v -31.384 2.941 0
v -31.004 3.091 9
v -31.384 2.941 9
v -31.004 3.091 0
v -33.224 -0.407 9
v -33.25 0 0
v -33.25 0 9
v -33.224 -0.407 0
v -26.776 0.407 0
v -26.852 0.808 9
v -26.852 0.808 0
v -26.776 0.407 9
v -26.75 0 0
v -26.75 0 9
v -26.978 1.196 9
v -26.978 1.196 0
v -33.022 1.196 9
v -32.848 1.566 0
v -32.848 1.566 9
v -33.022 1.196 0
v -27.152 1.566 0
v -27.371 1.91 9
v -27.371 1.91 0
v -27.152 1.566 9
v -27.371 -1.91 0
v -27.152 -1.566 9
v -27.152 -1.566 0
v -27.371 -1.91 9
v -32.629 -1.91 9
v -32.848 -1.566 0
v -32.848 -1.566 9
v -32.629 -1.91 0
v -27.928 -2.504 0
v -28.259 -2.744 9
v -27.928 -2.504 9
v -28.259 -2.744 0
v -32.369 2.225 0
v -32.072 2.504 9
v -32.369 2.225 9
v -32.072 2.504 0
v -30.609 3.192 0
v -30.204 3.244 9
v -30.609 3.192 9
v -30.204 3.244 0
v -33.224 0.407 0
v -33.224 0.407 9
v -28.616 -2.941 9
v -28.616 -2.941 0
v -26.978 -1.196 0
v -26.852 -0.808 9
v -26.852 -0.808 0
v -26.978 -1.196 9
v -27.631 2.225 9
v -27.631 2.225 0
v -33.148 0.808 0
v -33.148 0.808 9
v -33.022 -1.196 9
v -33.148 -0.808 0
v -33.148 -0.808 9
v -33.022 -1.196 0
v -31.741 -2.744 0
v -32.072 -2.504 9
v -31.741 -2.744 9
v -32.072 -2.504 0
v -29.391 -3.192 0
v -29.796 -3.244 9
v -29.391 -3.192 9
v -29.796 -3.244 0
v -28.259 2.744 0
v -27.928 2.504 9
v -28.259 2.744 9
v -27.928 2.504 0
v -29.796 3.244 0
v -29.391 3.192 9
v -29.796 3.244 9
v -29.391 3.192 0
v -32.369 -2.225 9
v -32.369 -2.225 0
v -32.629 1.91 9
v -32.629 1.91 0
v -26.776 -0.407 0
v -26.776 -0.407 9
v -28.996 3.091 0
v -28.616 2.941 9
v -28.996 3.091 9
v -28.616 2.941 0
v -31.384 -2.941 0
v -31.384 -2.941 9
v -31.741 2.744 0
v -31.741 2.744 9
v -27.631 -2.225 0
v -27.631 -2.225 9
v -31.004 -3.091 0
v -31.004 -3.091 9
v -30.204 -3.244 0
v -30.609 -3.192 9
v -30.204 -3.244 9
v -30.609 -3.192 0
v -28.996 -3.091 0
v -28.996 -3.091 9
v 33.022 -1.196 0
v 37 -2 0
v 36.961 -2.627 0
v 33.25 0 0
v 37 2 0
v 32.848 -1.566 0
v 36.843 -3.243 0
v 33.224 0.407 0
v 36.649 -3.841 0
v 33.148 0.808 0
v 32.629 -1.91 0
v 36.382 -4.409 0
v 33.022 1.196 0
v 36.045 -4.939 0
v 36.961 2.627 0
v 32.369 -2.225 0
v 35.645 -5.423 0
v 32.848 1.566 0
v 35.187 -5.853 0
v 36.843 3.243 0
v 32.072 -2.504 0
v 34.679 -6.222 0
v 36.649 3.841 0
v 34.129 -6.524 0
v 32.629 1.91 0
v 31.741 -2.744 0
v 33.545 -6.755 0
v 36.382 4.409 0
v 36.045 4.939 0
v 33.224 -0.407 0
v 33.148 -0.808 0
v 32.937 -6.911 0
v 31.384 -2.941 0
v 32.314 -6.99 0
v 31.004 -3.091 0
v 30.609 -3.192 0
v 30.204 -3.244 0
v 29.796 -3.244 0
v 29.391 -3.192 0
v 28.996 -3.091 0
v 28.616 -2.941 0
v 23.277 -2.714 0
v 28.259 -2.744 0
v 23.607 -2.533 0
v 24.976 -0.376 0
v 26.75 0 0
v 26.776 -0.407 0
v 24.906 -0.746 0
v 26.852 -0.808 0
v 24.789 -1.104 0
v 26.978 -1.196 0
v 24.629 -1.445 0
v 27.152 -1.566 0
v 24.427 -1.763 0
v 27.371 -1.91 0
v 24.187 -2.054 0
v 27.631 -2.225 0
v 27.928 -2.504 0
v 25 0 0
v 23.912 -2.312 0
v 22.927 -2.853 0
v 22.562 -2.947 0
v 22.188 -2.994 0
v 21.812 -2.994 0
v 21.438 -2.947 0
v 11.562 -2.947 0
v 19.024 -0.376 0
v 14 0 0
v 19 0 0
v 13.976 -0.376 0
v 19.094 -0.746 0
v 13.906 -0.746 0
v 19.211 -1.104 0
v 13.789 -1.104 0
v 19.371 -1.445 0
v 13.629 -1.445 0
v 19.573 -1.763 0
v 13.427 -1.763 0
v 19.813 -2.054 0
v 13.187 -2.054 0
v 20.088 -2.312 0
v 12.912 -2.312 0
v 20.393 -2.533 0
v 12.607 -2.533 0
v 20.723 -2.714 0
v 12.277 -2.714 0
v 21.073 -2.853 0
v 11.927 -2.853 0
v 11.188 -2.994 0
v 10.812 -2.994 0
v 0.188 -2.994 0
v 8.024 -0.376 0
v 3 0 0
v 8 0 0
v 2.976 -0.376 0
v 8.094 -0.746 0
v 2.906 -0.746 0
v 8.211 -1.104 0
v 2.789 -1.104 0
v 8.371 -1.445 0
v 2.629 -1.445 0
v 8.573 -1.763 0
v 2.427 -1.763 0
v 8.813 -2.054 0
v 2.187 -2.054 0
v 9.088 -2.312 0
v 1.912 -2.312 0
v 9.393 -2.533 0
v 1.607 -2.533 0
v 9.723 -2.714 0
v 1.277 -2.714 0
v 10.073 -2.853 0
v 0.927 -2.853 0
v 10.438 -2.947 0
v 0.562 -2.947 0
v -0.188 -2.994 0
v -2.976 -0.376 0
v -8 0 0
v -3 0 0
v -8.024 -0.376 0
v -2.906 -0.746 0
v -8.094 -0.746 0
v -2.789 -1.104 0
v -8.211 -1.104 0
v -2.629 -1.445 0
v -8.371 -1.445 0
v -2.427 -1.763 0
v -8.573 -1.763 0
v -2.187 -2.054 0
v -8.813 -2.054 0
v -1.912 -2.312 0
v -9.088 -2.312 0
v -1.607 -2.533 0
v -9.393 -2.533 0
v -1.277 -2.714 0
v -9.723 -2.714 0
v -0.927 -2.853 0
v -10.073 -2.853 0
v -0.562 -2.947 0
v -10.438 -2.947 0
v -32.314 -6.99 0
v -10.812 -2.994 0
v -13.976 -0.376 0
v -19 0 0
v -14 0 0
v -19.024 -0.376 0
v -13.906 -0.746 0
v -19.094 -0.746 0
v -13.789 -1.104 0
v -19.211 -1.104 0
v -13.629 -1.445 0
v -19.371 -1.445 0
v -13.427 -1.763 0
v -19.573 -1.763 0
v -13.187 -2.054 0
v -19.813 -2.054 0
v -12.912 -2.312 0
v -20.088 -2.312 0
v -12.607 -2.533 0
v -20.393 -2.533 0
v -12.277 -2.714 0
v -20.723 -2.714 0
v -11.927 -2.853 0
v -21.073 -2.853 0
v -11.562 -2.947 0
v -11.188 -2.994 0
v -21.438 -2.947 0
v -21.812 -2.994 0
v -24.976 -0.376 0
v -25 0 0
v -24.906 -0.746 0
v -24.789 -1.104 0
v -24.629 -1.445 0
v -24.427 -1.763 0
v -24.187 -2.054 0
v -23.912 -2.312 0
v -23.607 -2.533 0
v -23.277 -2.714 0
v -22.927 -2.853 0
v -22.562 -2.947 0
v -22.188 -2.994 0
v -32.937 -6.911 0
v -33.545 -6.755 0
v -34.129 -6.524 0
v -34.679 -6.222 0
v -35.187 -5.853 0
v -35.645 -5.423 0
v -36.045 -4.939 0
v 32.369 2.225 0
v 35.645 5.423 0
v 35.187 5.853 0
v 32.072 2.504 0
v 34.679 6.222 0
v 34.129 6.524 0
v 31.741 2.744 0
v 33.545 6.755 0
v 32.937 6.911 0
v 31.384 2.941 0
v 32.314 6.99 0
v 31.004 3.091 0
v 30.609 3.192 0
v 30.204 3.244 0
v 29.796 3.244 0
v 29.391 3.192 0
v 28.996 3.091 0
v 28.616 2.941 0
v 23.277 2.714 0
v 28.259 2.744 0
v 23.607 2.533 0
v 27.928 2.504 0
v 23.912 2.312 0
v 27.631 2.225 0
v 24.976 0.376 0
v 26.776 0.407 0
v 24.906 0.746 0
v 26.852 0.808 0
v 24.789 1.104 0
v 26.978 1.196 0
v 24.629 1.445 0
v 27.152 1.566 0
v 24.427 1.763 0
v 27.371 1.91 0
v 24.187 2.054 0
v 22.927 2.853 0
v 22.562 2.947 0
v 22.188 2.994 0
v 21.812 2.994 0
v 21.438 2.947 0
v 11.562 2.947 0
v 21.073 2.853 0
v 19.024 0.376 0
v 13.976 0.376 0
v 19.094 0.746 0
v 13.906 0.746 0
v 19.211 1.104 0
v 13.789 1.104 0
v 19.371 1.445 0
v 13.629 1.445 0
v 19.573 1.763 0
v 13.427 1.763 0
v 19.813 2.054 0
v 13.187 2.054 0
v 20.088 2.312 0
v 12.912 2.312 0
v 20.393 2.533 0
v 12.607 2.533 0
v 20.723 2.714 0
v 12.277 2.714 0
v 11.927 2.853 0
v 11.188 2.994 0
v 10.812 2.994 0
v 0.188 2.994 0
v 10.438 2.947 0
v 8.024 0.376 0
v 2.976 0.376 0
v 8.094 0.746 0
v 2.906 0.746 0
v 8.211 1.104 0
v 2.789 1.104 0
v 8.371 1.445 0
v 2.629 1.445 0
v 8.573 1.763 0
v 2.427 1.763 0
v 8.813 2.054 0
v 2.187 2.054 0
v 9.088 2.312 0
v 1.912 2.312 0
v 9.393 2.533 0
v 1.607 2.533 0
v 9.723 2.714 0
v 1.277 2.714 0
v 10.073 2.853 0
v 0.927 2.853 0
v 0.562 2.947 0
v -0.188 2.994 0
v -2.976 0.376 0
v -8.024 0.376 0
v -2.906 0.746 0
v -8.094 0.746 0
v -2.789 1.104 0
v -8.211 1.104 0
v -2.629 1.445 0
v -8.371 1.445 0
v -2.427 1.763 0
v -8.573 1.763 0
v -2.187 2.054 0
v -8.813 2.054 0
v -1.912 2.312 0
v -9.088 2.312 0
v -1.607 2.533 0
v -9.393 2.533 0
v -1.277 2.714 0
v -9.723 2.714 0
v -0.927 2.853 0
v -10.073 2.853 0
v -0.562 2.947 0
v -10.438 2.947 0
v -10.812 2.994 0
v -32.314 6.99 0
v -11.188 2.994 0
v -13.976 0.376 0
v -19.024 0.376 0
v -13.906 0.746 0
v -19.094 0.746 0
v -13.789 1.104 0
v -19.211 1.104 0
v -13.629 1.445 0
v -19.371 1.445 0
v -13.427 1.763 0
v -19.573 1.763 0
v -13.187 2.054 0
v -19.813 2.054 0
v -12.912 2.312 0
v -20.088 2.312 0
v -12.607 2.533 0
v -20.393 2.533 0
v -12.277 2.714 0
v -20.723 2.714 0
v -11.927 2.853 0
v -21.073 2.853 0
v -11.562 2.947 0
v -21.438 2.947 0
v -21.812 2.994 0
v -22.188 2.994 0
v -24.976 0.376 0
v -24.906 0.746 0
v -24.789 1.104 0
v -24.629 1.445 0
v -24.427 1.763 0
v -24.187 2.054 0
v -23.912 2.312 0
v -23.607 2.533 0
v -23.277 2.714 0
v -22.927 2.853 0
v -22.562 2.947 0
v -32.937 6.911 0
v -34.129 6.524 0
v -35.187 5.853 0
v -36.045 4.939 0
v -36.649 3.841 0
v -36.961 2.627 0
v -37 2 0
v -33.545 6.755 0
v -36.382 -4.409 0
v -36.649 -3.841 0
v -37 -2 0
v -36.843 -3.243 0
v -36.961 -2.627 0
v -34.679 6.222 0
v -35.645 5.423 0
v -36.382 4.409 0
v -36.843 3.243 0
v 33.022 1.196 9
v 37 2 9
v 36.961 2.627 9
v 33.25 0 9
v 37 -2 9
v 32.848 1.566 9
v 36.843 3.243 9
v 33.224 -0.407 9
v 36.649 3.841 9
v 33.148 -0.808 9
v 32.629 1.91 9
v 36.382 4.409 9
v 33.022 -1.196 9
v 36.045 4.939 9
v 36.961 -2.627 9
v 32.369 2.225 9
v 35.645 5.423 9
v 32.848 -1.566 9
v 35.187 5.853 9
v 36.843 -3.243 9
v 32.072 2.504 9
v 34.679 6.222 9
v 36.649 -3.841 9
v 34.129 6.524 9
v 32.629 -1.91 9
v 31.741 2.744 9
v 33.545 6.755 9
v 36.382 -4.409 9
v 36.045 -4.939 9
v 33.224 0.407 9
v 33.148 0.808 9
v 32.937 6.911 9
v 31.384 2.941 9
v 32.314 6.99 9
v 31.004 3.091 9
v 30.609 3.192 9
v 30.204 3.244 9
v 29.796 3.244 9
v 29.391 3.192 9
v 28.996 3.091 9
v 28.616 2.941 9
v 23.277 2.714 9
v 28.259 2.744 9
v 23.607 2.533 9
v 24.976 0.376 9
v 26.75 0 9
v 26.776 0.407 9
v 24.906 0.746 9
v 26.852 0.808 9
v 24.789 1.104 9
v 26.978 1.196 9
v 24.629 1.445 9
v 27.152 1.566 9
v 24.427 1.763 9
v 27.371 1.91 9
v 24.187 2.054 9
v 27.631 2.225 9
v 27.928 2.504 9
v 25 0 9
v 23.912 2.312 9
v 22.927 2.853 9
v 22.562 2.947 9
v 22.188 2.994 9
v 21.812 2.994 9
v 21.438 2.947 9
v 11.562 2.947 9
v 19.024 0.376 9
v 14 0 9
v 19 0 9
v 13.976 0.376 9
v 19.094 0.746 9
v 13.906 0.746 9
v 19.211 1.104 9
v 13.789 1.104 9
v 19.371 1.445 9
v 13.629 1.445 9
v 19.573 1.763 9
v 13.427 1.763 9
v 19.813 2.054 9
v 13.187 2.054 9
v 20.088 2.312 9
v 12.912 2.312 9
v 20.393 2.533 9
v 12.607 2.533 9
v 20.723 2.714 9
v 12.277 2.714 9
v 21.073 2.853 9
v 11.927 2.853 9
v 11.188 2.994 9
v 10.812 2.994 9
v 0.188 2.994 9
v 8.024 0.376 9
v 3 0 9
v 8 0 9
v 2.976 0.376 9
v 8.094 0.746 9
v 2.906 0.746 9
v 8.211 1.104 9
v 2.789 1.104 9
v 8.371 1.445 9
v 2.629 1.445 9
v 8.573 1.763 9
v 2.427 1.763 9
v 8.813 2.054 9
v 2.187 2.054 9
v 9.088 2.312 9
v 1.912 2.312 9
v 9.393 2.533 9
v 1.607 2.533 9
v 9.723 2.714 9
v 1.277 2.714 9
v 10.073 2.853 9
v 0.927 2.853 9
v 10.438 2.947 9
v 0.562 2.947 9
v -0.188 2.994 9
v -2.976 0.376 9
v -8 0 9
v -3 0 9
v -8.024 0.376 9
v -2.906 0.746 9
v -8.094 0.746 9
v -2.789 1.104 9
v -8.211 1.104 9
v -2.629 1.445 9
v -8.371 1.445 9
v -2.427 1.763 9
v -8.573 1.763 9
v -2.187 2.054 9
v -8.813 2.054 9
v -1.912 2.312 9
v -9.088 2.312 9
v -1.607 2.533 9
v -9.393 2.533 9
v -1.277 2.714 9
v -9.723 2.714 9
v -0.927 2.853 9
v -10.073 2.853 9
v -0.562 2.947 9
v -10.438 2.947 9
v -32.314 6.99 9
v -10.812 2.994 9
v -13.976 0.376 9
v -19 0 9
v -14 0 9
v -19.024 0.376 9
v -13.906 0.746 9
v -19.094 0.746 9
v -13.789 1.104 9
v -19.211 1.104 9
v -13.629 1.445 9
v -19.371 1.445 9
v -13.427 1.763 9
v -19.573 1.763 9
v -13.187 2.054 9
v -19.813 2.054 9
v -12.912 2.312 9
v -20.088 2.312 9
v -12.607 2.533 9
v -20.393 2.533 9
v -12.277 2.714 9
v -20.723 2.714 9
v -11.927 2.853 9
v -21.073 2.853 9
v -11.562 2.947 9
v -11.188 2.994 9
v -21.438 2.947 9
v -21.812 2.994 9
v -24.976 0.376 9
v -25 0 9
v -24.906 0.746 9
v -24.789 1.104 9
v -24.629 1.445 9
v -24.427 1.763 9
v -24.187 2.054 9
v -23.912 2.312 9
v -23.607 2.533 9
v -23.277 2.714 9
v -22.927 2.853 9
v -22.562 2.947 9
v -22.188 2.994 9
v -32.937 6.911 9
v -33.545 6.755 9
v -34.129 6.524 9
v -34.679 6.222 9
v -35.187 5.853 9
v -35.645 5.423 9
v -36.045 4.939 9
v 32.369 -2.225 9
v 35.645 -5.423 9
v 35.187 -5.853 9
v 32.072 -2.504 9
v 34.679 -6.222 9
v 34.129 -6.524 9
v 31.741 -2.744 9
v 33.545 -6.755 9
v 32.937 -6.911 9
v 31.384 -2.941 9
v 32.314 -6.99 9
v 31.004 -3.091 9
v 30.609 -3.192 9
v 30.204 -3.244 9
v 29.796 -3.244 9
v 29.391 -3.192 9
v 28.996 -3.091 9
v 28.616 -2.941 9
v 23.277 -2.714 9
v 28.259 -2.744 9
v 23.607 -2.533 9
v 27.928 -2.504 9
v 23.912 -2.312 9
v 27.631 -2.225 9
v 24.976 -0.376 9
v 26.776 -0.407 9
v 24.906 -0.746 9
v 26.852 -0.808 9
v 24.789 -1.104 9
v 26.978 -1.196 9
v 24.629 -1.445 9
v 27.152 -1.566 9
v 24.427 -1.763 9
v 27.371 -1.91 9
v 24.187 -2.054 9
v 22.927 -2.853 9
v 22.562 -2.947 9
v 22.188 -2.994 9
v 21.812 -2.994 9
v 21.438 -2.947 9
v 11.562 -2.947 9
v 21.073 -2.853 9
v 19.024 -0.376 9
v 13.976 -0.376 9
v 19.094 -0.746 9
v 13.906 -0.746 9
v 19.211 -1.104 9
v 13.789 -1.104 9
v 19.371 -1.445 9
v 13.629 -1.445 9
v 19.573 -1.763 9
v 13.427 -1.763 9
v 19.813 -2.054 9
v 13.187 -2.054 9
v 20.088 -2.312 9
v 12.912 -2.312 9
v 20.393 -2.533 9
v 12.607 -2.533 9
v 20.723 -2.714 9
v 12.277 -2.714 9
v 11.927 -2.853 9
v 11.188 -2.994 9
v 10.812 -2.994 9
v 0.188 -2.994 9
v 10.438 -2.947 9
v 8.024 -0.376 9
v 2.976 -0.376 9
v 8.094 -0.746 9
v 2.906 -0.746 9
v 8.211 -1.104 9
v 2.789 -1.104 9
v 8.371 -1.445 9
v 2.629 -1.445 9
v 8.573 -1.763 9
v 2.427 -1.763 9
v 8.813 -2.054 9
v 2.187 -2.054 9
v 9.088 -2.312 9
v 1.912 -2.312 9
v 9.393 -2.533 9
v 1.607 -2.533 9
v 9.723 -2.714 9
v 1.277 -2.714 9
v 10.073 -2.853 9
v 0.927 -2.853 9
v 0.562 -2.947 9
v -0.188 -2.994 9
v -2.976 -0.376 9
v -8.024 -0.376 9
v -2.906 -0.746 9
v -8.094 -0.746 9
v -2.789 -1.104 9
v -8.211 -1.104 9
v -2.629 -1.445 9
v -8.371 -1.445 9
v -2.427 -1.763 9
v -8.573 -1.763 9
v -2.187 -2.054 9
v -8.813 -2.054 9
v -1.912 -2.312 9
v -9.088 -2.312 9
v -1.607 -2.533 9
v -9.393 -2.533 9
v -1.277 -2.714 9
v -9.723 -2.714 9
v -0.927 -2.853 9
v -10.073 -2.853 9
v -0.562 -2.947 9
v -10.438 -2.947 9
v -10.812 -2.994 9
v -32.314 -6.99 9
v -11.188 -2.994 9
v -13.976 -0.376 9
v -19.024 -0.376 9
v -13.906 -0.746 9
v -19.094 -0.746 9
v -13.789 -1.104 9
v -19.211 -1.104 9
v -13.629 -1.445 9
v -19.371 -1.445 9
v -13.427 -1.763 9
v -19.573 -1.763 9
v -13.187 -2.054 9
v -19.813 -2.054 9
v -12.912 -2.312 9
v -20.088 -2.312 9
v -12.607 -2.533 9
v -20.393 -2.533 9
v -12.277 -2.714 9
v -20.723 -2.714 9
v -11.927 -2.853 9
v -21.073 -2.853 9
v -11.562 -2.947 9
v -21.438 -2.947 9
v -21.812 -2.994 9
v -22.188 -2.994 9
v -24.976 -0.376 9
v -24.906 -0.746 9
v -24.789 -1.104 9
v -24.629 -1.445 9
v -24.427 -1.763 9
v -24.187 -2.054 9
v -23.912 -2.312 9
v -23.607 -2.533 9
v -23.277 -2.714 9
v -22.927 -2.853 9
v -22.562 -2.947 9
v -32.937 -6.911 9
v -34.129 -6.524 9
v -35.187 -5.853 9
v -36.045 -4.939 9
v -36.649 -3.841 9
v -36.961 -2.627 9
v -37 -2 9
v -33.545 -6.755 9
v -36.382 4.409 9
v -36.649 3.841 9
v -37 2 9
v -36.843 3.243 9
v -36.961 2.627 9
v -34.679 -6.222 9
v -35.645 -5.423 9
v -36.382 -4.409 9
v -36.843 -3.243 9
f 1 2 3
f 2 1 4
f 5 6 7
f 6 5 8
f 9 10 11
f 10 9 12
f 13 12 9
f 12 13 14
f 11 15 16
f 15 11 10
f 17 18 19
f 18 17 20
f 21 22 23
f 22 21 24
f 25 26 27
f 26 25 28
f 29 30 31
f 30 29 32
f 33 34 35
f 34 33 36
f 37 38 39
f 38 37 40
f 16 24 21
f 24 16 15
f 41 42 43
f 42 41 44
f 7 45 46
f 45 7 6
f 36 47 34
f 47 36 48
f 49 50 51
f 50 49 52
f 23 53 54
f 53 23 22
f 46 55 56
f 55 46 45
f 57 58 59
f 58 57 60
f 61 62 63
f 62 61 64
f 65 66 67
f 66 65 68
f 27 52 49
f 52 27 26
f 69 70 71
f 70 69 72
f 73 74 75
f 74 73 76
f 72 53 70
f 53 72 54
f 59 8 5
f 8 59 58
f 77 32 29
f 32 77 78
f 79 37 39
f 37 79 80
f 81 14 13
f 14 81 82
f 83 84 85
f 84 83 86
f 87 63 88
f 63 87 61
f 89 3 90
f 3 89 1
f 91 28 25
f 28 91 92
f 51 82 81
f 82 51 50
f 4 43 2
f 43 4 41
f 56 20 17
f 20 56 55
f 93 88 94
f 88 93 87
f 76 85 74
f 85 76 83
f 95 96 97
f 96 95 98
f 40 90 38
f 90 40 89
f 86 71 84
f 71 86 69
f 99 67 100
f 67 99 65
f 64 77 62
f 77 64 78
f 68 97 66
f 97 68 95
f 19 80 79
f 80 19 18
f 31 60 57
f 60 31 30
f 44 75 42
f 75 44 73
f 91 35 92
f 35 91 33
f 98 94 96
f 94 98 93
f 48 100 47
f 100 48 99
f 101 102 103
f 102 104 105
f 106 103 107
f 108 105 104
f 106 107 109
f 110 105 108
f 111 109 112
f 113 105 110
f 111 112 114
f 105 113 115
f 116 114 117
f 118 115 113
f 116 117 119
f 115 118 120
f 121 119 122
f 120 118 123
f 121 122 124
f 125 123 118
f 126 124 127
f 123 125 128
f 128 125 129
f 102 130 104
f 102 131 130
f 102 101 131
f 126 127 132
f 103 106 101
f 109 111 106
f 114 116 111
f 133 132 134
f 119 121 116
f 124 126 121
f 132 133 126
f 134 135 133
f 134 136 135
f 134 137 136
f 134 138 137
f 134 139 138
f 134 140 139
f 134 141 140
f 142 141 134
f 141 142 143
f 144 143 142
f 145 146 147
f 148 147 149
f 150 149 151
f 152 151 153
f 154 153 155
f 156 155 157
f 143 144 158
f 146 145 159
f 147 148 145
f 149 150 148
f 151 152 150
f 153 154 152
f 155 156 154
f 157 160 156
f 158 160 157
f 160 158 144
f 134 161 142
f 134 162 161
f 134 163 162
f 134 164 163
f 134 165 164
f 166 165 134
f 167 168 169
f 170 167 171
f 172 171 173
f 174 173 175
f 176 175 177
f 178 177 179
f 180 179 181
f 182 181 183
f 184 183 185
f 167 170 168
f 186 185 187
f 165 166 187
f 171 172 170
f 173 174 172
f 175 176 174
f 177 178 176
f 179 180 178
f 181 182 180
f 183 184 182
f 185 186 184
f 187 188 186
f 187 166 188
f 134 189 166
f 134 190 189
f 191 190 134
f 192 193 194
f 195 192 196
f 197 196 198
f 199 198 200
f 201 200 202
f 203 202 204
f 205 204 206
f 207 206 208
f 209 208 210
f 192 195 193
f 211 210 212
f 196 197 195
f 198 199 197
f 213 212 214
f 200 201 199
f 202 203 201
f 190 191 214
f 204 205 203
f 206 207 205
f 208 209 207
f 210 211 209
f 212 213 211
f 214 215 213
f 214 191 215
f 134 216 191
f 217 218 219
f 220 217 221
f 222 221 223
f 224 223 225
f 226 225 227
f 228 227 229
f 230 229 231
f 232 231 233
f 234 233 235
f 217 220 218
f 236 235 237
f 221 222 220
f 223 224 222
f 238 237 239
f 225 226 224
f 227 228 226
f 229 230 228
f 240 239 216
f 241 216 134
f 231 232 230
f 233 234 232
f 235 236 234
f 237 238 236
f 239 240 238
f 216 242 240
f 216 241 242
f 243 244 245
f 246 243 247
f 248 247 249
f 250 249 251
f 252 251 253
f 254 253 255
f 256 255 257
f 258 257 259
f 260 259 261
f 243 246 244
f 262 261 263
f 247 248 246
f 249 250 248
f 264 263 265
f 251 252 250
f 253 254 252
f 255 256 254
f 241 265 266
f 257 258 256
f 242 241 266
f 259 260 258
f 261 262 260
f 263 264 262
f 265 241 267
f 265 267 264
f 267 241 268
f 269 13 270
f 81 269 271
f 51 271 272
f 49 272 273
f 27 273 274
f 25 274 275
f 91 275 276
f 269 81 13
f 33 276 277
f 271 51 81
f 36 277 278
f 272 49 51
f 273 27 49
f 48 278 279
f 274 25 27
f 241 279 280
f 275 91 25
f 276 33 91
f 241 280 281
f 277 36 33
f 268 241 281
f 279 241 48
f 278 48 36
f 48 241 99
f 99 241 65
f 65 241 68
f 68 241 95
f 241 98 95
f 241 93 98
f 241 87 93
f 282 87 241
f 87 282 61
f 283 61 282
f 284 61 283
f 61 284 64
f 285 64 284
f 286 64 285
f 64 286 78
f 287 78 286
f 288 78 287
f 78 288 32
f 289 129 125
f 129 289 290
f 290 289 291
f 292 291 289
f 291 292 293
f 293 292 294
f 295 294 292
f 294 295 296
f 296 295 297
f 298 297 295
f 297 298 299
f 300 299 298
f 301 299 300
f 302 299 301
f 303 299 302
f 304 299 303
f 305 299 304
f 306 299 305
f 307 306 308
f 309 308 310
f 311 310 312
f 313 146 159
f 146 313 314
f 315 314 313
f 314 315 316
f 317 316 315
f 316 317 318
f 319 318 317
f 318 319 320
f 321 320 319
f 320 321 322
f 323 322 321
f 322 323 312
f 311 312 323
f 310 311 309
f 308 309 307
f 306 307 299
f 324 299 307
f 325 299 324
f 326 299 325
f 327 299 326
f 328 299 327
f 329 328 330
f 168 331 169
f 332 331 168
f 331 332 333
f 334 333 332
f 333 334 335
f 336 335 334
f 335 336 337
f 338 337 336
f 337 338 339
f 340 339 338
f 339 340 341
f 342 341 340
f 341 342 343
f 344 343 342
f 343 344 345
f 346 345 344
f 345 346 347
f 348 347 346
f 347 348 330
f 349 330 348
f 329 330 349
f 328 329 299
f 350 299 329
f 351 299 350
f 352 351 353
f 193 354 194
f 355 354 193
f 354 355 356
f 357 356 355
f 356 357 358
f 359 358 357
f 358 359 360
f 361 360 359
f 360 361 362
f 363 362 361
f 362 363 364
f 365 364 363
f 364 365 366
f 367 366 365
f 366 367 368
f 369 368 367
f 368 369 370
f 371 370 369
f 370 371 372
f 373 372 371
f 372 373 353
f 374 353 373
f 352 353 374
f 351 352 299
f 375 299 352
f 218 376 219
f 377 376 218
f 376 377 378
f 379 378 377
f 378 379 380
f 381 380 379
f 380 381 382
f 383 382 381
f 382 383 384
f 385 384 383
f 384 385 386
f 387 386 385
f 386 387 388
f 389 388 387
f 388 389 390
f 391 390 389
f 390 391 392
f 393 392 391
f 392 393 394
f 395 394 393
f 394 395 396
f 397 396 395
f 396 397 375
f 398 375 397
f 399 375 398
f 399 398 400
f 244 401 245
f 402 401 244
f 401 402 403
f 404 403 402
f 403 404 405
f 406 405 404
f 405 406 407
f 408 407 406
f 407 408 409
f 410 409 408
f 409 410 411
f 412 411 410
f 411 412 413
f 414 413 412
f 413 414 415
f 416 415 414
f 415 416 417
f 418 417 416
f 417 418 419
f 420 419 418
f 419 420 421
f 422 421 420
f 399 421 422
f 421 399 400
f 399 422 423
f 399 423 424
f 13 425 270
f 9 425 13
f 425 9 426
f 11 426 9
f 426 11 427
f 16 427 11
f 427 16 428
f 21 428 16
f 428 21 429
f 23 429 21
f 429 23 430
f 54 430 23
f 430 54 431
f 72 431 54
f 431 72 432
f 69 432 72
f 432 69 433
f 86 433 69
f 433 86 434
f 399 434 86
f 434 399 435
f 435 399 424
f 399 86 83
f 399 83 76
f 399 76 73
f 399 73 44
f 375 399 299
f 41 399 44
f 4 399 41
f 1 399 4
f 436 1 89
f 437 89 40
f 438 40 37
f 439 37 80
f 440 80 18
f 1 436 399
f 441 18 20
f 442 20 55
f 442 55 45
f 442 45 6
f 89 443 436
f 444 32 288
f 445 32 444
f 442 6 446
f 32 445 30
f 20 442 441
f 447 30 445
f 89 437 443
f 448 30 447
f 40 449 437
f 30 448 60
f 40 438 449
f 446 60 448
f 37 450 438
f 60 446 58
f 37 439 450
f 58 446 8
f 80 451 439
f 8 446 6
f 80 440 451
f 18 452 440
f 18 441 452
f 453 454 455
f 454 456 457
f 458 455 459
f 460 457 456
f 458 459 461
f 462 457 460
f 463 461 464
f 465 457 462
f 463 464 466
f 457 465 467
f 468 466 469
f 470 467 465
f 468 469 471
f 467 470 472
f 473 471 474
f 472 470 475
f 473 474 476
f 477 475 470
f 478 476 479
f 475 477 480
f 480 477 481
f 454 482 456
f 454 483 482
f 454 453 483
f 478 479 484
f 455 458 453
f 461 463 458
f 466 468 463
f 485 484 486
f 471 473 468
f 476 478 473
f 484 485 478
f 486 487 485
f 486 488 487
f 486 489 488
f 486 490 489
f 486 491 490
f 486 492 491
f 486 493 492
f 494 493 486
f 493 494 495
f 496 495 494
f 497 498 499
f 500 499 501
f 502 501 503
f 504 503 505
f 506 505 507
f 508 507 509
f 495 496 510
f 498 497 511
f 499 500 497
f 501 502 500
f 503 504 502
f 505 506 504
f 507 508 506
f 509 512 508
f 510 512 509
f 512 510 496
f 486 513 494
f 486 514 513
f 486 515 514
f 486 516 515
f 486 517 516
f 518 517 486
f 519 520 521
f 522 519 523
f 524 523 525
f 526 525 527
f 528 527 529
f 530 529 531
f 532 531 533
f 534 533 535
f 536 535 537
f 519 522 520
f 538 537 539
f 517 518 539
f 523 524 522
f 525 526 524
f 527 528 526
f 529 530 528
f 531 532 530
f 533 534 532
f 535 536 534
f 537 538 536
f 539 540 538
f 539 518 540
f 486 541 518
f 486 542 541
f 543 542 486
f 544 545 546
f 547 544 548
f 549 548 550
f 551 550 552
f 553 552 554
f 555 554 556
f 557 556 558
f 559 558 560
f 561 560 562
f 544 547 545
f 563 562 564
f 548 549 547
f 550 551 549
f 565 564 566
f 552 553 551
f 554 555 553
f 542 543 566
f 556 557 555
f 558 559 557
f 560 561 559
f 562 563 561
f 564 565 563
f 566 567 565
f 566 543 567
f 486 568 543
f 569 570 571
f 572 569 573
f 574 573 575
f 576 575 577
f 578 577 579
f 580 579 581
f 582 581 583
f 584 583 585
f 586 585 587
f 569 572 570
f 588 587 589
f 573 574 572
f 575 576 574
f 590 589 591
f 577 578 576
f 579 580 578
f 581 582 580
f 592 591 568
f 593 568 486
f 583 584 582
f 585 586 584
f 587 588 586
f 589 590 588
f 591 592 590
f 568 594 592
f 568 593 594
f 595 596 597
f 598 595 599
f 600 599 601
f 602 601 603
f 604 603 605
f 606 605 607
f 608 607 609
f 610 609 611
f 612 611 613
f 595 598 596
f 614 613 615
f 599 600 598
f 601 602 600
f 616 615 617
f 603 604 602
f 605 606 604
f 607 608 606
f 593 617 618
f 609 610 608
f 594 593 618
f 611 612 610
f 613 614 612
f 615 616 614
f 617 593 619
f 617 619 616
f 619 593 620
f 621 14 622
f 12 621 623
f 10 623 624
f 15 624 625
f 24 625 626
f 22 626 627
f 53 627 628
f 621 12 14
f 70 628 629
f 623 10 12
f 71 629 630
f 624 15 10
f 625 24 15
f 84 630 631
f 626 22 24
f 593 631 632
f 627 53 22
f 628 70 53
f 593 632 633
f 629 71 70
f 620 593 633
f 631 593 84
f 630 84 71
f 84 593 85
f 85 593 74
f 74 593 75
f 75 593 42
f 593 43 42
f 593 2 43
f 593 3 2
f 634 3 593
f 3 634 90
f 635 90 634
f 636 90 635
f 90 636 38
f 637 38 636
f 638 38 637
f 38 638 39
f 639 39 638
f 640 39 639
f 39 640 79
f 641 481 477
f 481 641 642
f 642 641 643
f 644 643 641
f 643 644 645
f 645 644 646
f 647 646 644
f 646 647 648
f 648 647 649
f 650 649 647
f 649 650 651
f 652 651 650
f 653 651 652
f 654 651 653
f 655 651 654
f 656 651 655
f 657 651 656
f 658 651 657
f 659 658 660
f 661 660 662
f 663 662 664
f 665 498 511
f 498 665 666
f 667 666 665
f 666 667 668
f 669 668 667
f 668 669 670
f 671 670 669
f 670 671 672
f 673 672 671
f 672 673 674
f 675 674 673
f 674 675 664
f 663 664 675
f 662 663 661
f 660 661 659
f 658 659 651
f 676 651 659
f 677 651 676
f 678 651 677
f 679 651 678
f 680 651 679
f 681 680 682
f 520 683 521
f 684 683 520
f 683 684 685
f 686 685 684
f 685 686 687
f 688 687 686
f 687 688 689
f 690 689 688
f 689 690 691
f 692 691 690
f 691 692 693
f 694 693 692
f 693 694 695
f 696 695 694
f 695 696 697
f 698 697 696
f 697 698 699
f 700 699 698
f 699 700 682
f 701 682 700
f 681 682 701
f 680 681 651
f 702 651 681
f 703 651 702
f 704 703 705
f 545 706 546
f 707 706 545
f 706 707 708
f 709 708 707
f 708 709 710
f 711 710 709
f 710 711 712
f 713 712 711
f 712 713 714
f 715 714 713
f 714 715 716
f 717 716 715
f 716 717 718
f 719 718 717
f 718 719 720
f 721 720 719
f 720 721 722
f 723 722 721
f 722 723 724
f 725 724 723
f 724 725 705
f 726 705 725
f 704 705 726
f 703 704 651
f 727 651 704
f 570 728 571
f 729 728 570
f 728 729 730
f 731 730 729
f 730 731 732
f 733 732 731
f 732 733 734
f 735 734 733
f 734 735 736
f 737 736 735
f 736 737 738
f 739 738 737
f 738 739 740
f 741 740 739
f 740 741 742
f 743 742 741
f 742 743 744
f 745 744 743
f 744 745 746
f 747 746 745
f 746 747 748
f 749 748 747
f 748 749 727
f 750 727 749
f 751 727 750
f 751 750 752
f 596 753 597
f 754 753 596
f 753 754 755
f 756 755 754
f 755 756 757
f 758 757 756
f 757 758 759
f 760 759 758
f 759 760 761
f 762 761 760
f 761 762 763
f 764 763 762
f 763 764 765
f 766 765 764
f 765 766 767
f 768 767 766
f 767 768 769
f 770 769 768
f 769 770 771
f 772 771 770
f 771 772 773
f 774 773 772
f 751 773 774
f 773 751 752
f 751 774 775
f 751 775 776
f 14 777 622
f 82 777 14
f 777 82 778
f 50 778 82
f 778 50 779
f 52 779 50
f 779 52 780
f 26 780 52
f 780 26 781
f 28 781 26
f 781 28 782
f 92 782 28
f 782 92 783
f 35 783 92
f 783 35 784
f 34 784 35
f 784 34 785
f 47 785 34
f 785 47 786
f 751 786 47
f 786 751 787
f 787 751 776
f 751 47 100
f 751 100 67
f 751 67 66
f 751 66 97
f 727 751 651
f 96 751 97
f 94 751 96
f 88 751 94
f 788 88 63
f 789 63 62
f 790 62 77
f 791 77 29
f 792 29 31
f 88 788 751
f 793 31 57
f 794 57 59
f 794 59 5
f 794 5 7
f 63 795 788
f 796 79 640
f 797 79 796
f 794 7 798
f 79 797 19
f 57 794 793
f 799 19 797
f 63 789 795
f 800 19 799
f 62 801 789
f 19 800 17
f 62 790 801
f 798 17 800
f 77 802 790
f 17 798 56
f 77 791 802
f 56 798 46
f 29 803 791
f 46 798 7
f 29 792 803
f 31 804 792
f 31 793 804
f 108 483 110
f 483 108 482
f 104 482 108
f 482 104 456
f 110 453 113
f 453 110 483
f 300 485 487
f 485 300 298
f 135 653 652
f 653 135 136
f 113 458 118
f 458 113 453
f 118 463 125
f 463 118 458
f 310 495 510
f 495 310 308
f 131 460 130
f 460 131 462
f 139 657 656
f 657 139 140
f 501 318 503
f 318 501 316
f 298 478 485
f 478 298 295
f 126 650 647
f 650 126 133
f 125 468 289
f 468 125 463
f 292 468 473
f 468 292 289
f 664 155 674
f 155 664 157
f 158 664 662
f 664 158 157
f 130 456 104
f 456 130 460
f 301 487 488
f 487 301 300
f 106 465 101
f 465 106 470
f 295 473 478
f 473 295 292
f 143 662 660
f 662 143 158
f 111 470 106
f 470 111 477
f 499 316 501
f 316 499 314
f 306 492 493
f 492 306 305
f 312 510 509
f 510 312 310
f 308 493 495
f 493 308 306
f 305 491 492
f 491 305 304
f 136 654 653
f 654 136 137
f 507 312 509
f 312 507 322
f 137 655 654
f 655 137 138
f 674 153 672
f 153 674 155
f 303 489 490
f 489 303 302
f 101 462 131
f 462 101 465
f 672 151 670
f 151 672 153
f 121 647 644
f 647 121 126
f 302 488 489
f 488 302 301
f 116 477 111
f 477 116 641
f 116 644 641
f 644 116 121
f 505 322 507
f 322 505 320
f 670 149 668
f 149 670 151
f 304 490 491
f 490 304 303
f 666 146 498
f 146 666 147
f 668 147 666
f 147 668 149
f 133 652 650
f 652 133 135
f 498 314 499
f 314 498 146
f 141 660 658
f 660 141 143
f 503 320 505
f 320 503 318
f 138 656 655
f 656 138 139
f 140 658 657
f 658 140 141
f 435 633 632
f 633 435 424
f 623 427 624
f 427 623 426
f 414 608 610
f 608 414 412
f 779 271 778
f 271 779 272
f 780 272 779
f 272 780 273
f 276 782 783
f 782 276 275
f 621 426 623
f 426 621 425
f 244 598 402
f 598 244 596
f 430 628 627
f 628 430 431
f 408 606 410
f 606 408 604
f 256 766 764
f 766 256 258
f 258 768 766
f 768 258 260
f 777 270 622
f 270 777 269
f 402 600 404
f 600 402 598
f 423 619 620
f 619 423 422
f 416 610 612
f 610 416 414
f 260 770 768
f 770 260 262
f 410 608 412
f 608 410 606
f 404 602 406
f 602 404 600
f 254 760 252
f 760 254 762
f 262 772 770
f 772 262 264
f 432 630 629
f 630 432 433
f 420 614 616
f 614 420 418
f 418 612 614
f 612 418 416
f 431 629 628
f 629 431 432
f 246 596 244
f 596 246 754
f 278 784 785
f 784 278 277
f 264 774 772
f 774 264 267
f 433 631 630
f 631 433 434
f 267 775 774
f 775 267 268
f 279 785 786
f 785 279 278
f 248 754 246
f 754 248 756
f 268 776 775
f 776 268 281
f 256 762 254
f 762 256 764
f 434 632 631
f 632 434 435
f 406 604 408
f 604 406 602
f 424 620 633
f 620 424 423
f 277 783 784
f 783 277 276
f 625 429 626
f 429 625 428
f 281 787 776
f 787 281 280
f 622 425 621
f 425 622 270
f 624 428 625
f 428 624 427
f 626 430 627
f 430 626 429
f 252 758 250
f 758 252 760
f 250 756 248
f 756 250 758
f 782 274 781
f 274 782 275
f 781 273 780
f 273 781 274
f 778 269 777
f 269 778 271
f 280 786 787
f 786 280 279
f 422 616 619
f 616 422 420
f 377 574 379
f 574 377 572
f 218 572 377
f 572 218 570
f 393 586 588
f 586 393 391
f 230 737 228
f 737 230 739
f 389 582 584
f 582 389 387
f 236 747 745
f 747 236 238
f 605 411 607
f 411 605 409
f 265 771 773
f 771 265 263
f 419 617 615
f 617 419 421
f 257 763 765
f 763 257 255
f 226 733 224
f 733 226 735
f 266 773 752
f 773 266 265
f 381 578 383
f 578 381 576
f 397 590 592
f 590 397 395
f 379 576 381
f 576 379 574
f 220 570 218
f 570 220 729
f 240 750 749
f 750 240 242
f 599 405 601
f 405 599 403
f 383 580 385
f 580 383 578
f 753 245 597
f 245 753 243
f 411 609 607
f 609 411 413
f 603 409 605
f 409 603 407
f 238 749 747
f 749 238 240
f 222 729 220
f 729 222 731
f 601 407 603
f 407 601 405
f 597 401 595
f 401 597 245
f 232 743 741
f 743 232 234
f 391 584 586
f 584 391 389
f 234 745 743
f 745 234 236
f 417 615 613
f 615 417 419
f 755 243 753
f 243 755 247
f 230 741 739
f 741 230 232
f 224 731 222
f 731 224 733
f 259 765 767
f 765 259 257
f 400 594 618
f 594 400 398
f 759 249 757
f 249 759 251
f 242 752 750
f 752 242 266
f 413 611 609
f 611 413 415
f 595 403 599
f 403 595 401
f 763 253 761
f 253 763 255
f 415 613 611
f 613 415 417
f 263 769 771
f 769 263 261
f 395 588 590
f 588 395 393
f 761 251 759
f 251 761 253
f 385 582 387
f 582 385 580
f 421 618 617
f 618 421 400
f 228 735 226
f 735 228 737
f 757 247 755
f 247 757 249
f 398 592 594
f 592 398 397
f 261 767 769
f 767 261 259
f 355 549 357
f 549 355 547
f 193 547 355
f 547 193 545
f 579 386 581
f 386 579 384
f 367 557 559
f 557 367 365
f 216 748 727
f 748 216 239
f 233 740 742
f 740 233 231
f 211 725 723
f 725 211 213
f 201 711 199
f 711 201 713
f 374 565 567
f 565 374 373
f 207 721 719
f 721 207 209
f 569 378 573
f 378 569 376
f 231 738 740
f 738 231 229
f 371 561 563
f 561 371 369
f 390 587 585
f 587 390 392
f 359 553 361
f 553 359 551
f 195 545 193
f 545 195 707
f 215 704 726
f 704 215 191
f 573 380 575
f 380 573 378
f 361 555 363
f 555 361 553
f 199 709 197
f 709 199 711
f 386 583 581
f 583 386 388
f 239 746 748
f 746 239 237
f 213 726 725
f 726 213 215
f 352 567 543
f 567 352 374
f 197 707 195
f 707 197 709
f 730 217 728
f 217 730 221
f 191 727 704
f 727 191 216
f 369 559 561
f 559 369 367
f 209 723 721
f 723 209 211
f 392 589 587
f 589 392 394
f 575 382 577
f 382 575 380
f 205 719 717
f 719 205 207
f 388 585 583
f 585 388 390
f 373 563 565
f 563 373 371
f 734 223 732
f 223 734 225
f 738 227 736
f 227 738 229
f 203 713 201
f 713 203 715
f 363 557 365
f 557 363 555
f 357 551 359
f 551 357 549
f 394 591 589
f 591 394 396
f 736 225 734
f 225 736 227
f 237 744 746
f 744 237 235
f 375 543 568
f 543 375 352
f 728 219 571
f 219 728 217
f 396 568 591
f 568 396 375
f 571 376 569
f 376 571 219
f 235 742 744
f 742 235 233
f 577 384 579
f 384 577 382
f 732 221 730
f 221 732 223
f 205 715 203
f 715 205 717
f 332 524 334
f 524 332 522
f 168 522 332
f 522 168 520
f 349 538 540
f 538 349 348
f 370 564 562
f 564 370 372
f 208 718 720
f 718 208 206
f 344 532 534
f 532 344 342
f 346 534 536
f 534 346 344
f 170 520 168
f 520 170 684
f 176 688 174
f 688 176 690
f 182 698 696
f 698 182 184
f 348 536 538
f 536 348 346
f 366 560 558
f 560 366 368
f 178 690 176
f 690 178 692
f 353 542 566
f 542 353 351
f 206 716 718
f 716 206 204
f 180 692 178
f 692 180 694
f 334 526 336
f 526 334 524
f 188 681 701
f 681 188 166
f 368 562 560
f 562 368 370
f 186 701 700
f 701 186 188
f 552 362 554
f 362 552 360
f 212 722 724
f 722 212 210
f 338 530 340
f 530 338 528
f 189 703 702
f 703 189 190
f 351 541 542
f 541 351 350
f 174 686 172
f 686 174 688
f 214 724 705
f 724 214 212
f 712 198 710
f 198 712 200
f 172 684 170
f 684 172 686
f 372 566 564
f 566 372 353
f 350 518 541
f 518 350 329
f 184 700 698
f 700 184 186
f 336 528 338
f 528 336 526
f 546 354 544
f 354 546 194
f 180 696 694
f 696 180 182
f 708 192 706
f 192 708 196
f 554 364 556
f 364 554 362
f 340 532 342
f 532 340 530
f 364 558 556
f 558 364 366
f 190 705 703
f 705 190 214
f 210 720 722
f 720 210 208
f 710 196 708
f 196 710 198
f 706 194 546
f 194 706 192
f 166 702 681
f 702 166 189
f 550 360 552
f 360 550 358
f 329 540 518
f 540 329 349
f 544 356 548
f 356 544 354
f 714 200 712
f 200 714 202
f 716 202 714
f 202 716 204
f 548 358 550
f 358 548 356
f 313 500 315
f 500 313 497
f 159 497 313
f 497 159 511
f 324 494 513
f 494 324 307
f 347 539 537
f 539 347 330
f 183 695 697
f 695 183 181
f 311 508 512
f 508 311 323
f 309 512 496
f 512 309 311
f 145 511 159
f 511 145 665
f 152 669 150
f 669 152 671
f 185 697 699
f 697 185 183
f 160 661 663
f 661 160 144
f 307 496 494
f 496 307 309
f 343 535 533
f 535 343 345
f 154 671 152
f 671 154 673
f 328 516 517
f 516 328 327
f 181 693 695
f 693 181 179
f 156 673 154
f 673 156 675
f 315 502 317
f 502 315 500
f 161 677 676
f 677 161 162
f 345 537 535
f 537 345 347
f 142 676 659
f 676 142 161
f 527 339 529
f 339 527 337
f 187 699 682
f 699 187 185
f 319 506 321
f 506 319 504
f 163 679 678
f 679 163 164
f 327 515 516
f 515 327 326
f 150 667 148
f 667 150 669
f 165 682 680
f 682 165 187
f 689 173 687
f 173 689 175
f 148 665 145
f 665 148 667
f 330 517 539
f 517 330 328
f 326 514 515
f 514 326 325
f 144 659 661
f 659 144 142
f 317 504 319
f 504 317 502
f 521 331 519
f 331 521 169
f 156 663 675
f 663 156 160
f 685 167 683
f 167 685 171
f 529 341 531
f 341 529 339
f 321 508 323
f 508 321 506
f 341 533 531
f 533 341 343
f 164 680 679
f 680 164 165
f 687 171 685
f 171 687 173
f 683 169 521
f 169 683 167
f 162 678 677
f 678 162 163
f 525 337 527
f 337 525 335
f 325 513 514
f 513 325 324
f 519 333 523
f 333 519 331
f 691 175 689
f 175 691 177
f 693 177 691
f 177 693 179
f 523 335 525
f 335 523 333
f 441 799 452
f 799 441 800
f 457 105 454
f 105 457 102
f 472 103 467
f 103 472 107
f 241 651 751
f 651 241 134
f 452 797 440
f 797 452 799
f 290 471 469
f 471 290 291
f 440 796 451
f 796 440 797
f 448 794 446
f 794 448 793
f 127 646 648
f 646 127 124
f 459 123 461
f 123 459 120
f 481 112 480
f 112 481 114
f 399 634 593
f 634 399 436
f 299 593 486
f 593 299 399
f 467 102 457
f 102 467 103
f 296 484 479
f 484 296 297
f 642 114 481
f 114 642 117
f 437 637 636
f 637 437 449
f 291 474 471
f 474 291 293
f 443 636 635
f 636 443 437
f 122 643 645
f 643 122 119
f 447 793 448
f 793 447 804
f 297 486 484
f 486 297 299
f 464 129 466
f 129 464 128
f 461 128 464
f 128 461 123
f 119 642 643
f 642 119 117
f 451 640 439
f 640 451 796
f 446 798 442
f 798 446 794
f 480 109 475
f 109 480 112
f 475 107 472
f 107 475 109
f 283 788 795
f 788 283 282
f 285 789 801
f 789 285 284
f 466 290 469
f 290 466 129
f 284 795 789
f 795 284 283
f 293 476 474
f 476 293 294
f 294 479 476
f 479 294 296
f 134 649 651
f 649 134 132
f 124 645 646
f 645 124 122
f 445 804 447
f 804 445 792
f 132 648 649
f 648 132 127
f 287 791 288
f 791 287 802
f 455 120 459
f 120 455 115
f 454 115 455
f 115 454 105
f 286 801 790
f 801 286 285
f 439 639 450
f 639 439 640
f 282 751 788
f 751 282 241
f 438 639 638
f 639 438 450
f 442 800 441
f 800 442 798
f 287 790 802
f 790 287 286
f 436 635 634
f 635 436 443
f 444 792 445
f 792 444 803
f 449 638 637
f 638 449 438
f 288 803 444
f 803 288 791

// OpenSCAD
$fn = 50;

difference() {
	union() {
		hull() {
			translate(v = [-32.0, 2.0, 0]) {
				cylinder(h = 9, r = 5);
			}
			translate(v = [32.0, 2.0, 0]) {
				cylinder(h = 9, r = 5);
			}
			translate(v = [-32.0, -2.0, 0]) {
				cylinder(h = 9, r = 5);
			}
			translate(v = [32.0, -2.0, 0]) {
				cylinder(h = 9, r = 5);
			}
		}
	}
	union() {
		translate(v = [-30.0, 0.0, 0]) {
			cylinder(h = 9, r = 3.25);
		}
		translate(v = [30.0, 0.0, 0]) {
			cylinder(h = 9, r = 3.25);
		}
		translate(v = [-22.0, 0, 0.0]) {
			cylinder(h = 9, r = 3.0);
		}
		translate(v = [-11.0, 0, 0.0]) {
			cylinder(h = 9, r = 3.0);
		}
		cylinder(h = 9, r = 3.0);
		translate(v = [11.0, 0, 0.0]) {
			cylinder(h = 9, r = 3.0);
		}
		translate(v = [22.0, 0, 0.0]) {
			cylinder(h = 9, r = 3.0);
		}
	}
}
